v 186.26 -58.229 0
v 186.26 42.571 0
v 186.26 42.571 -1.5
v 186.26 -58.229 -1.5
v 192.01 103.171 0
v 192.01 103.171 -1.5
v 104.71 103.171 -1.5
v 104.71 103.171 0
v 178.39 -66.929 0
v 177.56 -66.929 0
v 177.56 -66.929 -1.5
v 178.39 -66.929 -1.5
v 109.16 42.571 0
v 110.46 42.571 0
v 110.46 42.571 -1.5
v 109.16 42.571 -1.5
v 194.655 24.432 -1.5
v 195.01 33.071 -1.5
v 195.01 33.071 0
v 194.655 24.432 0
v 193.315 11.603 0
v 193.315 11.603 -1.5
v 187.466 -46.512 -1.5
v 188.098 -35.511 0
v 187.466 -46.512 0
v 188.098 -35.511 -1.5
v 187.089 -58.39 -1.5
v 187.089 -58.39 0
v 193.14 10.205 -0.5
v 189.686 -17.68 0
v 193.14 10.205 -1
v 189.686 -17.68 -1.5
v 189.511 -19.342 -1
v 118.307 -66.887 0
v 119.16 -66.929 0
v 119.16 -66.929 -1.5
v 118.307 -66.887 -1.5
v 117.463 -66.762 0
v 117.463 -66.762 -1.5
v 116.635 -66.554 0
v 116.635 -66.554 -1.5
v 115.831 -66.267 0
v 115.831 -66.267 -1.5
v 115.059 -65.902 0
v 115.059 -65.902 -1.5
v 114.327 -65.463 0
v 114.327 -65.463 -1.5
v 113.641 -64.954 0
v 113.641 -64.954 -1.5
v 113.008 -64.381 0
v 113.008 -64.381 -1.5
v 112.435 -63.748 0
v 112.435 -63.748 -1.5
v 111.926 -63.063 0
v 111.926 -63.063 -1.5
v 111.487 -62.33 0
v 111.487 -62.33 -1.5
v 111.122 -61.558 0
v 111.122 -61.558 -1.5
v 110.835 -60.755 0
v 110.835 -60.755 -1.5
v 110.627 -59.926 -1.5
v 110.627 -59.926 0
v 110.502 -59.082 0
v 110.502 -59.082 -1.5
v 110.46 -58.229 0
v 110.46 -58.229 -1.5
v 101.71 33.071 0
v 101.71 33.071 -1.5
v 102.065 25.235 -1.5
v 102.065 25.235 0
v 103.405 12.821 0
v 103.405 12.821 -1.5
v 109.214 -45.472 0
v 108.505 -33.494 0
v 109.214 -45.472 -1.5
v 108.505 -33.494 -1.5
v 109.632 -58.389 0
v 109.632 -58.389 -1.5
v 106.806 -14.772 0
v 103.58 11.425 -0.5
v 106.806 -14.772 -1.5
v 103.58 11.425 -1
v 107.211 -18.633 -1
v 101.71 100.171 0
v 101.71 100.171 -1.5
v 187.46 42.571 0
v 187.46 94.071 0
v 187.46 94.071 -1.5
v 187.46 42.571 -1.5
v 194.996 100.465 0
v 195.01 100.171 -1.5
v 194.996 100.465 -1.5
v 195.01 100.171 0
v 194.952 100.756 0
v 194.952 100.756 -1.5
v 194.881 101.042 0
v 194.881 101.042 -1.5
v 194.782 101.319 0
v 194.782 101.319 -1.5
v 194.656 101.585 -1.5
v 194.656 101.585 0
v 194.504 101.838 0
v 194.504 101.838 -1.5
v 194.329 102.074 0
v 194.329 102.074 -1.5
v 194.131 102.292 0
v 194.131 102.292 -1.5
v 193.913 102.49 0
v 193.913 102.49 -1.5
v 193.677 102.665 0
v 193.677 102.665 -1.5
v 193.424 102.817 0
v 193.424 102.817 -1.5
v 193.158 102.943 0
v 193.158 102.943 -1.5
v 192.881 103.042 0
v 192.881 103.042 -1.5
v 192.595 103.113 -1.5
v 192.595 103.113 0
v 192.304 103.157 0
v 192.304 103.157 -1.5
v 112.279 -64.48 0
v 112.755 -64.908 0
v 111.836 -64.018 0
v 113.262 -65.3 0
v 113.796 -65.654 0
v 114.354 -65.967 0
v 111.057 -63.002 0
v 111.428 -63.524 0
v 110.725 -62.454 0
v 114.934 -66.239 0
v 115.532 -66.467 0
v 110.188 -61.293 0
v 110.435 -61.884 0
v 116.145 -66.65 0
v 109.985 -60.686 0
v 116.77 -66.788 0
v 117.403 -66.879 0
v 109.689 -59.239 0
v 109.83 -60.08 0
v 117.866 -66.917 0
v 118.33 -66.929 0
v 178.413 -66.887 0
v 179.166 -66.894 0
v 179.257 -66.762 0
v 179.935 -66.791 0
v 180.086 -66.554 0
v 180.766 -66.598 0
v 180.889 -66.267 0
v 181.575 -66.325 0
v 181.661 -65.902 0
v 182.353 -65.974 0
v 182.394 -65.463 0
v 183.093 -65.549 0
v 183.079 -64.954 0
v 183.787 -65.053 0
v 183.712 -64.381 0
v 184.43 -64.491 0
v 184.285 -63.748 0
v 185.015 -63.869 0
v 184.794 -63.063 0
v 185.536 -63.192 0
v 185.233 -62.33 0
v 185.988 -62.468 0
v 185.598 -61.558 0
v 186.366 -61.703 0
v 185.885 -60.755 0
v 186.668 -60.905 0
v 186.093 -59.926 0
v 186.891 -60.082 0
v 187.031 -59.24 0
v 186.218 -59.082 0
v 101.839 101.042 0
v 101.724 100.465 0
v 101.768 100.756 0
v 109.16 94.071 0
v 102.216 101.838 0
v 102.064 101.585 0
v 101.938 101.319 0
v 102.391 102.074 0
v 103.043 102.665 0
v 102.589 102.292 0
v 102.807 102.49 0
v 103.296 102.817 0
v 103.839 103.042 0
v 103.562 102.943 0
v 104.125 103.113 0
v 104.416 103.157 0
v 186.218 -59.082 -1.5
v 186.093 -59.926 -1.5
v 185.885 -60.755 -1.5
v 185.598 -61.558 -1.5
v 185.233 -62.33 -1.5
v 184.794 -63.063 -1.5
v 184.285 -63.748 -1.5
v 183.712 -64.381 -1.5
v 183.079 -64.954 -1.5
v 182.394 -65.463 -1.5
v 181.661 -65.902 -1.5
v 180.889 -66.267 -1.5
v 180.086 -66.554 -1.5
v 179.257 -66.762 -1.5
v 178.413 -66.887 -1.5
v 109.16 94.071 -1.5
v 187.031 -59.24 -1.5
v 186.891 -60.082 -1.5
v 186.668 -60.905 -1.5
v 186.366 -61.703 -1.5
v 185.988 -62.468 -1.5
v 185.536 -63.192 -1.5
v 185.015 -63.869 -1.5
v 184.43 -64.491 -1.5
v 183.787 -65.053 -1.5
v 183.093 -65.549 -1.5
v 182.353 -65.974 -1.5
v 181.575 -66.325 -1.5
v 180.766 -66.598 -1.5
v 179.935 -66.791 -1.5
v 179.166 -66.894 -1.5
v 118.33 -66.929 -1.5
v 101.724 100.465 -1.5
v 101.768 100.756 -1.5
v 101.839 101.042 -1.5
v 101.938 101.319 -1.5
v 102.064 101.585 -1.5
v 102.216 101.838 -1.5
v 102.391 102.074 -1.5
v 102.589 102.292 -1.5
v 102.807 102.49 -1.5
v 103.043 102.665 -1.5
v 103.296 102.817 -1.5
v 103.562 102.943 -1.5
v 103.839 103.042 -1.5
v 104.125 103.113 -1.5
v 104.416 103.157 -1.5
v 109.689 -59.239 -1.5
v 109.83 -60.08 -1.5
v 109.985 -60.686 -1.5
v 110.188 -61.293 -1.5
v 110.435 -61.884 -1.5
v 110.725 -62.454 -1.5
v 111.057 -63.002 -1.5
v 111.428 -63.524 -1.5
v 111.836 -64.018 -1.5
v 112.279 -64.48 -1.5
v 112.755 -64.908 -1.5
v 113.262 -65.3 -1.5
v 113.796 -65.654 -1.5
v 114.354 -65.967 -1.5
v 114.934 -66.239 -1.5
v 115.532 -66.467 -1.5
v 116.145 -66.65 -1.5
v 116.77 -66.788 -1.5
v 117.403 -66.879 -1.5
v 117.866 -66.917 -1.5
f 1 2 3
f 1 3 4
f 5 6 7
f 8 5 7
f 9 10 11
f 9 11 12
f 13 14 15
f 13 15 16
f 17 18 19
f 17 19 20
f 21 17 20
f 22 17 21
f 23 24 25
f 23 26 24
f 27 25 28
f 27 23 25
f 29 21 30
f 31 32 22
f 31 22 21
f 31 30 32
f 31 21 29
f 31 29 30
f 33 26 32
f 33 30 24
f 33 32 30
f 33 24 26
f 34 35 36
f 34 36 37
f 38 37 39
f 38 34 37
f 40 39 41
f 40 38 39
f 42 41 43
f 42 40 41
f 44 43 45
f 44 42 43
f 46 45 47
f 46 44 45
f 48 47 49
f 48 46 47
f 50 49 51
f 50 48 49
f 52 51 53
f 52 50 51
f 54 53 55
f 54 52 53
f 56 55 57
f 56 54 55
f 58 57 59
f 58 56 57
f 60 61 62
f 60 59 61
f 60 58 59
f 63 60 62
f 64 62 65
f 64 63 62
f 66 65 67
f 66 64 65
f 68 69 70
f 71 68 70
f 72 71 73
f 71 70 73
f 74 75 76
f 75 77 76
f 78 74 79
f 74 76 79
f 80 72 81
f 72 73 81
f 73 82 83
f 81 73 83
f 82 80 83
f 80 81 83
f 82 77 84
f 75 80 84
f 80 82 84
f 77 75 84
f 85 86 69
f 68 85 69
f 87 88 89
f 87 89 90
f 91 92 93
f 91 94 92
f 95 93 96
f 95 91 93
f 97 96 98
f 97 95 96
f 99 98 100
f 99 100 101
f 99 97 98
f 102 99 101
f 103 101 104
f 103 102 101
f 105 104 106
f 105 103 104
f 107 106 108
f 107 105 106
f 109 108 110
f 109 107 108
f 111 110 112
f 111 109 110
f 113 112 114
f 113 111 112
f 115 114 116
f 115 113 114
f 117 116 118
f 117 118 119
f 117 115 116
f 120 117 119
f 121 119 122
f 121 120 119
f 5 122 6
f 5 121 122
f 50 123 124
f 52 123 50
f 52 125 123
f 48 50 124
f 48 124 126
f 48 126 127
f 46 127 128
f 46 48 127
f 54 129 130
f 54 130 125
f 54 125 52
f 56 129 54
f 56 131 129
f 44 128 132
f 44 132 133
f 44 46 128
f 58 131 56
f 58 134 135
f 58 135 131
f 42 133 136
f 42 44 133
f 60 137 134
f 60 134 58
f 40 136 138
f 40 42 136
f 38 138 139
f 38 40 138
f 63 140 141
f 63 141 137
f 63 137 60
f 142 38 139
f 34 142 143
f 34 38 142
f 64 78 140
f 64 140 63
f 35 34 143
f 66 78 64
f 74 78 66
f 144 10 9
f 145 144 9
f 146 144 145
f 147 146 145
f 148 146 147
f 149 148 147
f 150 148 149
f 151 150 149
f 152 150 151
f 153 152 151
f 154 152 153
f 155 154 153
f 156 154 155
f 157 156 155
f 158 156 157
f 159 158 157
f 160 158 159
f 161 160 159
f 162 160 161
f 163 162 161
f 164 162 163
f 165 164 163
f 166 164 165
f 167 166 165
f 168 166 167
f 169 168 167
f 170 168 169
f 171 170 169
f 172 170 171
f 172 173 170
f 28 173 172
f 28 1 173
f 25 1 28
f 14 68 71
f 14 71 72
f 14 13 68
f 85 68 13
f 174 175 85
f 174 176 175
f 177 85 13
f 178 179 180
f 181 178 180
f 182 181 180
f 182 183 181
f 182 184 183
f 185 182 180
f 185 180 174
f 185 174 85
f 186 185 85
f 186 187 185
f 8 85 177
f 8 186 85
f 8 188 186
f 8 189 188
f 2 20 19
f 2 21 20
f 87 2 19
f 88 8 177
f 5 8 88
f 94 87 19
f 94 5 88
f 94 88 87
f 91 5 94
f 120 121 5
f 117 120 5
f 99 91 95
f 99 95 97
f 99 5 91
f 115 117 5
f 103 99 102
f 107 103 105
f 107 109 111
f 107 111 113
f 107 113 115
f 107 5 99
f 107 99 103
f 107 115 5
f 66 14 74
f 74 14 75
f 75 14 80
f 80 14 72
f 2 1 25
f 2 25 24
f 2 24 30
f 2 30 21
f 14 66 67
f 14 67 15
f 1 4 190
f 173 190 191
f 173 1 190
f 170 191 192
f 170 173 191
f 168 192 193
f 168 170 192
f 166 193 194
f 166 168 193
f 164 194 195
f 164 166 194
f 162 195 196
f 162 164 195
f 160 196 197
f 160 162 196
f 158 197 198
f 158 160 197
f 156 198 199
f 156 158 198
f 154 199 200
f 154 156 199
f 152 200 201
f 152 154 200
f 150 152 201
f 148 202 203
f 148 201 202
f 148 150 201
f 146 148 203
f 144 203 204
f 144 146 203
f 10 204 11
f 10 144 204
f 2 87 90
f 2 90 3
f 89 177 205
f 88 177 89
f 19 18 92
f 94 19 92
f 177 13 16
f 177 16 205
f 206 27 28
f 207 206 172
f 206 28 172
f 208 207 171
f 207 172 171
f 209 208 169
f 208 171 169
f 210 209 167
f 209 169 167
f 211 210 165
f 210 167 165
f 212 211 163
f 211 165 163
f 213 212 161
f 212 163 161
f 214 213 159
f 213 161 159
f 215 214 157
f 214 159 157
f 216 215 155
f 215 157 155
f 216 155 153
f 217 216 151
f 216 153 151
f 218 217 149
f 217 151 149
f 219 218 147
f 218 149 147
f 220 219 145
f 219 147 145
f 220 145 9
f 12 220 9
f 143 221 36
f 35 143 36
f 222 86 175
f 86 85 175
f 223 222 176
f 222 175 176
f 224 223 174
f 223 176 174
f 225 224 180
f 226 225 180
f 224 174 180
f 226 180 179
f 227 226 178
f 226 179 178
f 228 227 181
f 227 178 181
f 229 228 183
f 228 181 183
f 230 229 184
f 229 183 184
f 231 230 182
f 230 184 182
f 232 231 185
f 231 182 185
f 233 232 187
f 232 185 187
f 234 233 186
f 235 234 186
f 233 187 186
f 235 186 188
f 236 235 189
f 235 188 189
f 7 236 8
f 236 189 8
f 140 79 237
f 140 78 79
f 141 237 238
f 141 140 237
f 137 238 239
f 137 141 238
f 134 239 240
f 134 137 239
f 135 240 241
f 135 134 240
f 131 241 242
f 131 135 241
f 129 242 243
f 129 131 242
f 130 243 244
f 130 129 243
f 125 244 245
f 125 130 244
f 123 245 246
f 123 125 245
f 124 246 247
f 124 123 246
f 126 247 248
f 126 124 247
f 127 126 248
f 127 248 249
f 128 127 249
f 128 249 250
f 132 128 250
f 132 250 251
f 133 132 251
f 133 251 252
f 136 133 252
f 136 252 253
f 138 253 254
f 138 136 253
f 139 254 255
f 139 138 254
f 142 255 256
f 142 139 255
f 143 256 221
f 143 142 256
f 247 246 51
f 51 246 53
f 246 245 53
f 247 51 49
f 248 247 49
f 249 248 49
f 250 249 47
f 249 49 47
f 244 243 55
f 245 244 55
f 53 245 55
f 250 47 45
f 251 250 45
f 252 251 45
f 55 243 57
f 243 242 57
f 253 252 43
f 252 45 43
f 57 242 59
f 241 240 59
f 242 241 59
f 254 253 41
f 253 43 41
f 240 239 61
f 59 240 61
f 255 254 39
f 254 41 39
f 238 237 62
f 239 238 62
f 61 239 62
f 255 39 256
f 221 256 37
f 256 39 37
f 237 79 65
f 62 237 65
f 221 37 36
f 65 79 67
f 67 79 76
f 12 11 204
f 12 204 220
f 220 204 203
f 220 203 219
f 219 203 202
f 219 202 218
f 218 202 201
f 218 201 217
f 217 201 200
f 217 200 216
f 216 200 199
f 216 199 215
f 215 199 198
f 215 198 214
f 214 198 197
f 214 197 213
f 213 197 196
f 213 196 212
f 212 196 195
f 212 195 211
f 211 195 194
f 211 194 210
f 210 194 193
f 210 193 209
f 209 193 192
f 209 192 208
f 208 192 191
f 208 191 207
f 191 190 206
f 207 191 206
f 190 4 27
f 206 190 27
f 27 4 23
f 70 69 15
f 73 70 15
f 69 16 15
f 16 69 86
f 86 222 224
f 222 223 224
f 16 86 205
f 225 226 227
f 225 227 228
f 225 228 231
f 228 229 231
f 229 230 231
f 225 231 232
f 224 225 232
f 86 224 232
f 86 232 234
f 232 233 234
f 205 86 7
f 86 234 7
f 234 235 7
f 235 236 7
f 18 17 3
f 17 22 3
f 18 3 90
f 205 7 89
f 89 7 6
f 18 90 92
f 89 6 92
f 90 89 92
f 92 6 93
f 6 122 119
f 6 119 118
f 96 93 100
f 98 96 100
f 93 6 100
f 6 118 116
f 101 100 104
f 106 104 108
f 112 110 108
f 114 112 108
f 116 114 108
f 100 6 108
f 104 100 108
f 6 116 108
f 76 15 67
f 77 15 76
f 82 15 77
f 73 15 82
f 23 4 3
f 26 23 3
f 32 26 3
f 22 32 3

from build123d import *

# Parameters (mm, degrees)
BOSS_EXTRUDE1_START = -1.5
BOSS_EXTRUDE1_DEPTH = 1.5
CUT_EXTRUDE1_DEPTH  = 14
FILLET1_R           = 8.7
FILLET2_R           = 3


# Read off the part's stored shape, not the designer's step: Boss-Extrude1
with BuildPart() as part:
    # Boss-Extrude1 outline → Boss-Extrude1 (new body)
    with BuildSketch(Plane.XY.offset(BOSS_EXTRUDE1_START)):
        with BuildLine():
            Line((101.710048323, 103.170955585), (101.710048323, 33.070955585))
            add(Edge.make_bspline(
                [(101.710048323, 33.070955585), (101.710048323, 14.099715191), (109.710048323, -16.929044415), (109.710048323, -66.929044415)],
                knots=[0, 0, 0, 0, 1, 1, 1, 1], degree=3))
            Line((109.710048323, -66.929044415), (187.010048323, -66.929044415))
            add(Edge.make_bspline(
                [(195.010048323, 33.070955585), (195.010048323, 11.335097122), (187.010048323, -16.929044415), (187.010048323, -66.929044415)],
                knots=[0, 0, 0, 0, 1, 1, 1, 1], degree=3))
            Line((195.010048323, 33.070955585), (195.010048323, 103.170955585))
            Line((195.010048323, 103.170955585), (101.710048323, 103.170955585))
        make_face()
    extrude(amount=BOSS_EXTRUDE1_DEPTH)

    # Sketch2 → Cut-Extrude1 (cut)
    with BuildSketch(Plane.XY):
        with BuildLine():
            Line((109.160048323, 94.070955585), (187.460048323, 94.070955585))
            Line((187.460048323, 94.070955585), (187.460048323, 42.570955585))
            Line((187.460048323, 42.570955585), (186.260048323, 42.570955585))
            Line((186.260048323, 42.570955585), (186.260048323, -58.229044415))
            ThreePointArc((186.260048323, -58.229044415), (183.711877319, -64.380873411), (177.560048323, -66.929044415))
            Line((177.560048323, -66.929044415), (119.160048323, -66.929044415))
            ThreePointArc((119.160048323, -66.929044415), (113.008219327, -64.380873411), (110.460048323, -58.229044415))
            Line((110.460048323, -58.229044415), (110.460048323, 42.570955585))
            Line((110.460048323, 42.570955585), (109.160048323, 42.570955585))
            Line((109.160048323, 42.570955585), (109.160048323, 94.070955585))
        make_face()
    extrude(amount=-CUT_EXTRUDE1_DEPTH, mode=Mode.SUBTRACT)

    # Fillet1
    fillet1_edges = [part.edges().sort_by_distance(p)[0] for p in [
        (187.010048323, -66.929044415, -0.75),
        (109.710048323, -66.929044415, -0.75),
    ]]
    fillet(fillet1_edges, radius=FILLET1_R)

    # Fillet2
    fillet2_edges = [part.edges().sort_by_distance(p)[0] for p in [
        (101.710048323, 103.170955585, -0.75),
        (195.010048323, 103.170955585, -0.75),
    ]]
    fillet(fillet2_edges, radius=FILLET2_R)


solid = part.part
